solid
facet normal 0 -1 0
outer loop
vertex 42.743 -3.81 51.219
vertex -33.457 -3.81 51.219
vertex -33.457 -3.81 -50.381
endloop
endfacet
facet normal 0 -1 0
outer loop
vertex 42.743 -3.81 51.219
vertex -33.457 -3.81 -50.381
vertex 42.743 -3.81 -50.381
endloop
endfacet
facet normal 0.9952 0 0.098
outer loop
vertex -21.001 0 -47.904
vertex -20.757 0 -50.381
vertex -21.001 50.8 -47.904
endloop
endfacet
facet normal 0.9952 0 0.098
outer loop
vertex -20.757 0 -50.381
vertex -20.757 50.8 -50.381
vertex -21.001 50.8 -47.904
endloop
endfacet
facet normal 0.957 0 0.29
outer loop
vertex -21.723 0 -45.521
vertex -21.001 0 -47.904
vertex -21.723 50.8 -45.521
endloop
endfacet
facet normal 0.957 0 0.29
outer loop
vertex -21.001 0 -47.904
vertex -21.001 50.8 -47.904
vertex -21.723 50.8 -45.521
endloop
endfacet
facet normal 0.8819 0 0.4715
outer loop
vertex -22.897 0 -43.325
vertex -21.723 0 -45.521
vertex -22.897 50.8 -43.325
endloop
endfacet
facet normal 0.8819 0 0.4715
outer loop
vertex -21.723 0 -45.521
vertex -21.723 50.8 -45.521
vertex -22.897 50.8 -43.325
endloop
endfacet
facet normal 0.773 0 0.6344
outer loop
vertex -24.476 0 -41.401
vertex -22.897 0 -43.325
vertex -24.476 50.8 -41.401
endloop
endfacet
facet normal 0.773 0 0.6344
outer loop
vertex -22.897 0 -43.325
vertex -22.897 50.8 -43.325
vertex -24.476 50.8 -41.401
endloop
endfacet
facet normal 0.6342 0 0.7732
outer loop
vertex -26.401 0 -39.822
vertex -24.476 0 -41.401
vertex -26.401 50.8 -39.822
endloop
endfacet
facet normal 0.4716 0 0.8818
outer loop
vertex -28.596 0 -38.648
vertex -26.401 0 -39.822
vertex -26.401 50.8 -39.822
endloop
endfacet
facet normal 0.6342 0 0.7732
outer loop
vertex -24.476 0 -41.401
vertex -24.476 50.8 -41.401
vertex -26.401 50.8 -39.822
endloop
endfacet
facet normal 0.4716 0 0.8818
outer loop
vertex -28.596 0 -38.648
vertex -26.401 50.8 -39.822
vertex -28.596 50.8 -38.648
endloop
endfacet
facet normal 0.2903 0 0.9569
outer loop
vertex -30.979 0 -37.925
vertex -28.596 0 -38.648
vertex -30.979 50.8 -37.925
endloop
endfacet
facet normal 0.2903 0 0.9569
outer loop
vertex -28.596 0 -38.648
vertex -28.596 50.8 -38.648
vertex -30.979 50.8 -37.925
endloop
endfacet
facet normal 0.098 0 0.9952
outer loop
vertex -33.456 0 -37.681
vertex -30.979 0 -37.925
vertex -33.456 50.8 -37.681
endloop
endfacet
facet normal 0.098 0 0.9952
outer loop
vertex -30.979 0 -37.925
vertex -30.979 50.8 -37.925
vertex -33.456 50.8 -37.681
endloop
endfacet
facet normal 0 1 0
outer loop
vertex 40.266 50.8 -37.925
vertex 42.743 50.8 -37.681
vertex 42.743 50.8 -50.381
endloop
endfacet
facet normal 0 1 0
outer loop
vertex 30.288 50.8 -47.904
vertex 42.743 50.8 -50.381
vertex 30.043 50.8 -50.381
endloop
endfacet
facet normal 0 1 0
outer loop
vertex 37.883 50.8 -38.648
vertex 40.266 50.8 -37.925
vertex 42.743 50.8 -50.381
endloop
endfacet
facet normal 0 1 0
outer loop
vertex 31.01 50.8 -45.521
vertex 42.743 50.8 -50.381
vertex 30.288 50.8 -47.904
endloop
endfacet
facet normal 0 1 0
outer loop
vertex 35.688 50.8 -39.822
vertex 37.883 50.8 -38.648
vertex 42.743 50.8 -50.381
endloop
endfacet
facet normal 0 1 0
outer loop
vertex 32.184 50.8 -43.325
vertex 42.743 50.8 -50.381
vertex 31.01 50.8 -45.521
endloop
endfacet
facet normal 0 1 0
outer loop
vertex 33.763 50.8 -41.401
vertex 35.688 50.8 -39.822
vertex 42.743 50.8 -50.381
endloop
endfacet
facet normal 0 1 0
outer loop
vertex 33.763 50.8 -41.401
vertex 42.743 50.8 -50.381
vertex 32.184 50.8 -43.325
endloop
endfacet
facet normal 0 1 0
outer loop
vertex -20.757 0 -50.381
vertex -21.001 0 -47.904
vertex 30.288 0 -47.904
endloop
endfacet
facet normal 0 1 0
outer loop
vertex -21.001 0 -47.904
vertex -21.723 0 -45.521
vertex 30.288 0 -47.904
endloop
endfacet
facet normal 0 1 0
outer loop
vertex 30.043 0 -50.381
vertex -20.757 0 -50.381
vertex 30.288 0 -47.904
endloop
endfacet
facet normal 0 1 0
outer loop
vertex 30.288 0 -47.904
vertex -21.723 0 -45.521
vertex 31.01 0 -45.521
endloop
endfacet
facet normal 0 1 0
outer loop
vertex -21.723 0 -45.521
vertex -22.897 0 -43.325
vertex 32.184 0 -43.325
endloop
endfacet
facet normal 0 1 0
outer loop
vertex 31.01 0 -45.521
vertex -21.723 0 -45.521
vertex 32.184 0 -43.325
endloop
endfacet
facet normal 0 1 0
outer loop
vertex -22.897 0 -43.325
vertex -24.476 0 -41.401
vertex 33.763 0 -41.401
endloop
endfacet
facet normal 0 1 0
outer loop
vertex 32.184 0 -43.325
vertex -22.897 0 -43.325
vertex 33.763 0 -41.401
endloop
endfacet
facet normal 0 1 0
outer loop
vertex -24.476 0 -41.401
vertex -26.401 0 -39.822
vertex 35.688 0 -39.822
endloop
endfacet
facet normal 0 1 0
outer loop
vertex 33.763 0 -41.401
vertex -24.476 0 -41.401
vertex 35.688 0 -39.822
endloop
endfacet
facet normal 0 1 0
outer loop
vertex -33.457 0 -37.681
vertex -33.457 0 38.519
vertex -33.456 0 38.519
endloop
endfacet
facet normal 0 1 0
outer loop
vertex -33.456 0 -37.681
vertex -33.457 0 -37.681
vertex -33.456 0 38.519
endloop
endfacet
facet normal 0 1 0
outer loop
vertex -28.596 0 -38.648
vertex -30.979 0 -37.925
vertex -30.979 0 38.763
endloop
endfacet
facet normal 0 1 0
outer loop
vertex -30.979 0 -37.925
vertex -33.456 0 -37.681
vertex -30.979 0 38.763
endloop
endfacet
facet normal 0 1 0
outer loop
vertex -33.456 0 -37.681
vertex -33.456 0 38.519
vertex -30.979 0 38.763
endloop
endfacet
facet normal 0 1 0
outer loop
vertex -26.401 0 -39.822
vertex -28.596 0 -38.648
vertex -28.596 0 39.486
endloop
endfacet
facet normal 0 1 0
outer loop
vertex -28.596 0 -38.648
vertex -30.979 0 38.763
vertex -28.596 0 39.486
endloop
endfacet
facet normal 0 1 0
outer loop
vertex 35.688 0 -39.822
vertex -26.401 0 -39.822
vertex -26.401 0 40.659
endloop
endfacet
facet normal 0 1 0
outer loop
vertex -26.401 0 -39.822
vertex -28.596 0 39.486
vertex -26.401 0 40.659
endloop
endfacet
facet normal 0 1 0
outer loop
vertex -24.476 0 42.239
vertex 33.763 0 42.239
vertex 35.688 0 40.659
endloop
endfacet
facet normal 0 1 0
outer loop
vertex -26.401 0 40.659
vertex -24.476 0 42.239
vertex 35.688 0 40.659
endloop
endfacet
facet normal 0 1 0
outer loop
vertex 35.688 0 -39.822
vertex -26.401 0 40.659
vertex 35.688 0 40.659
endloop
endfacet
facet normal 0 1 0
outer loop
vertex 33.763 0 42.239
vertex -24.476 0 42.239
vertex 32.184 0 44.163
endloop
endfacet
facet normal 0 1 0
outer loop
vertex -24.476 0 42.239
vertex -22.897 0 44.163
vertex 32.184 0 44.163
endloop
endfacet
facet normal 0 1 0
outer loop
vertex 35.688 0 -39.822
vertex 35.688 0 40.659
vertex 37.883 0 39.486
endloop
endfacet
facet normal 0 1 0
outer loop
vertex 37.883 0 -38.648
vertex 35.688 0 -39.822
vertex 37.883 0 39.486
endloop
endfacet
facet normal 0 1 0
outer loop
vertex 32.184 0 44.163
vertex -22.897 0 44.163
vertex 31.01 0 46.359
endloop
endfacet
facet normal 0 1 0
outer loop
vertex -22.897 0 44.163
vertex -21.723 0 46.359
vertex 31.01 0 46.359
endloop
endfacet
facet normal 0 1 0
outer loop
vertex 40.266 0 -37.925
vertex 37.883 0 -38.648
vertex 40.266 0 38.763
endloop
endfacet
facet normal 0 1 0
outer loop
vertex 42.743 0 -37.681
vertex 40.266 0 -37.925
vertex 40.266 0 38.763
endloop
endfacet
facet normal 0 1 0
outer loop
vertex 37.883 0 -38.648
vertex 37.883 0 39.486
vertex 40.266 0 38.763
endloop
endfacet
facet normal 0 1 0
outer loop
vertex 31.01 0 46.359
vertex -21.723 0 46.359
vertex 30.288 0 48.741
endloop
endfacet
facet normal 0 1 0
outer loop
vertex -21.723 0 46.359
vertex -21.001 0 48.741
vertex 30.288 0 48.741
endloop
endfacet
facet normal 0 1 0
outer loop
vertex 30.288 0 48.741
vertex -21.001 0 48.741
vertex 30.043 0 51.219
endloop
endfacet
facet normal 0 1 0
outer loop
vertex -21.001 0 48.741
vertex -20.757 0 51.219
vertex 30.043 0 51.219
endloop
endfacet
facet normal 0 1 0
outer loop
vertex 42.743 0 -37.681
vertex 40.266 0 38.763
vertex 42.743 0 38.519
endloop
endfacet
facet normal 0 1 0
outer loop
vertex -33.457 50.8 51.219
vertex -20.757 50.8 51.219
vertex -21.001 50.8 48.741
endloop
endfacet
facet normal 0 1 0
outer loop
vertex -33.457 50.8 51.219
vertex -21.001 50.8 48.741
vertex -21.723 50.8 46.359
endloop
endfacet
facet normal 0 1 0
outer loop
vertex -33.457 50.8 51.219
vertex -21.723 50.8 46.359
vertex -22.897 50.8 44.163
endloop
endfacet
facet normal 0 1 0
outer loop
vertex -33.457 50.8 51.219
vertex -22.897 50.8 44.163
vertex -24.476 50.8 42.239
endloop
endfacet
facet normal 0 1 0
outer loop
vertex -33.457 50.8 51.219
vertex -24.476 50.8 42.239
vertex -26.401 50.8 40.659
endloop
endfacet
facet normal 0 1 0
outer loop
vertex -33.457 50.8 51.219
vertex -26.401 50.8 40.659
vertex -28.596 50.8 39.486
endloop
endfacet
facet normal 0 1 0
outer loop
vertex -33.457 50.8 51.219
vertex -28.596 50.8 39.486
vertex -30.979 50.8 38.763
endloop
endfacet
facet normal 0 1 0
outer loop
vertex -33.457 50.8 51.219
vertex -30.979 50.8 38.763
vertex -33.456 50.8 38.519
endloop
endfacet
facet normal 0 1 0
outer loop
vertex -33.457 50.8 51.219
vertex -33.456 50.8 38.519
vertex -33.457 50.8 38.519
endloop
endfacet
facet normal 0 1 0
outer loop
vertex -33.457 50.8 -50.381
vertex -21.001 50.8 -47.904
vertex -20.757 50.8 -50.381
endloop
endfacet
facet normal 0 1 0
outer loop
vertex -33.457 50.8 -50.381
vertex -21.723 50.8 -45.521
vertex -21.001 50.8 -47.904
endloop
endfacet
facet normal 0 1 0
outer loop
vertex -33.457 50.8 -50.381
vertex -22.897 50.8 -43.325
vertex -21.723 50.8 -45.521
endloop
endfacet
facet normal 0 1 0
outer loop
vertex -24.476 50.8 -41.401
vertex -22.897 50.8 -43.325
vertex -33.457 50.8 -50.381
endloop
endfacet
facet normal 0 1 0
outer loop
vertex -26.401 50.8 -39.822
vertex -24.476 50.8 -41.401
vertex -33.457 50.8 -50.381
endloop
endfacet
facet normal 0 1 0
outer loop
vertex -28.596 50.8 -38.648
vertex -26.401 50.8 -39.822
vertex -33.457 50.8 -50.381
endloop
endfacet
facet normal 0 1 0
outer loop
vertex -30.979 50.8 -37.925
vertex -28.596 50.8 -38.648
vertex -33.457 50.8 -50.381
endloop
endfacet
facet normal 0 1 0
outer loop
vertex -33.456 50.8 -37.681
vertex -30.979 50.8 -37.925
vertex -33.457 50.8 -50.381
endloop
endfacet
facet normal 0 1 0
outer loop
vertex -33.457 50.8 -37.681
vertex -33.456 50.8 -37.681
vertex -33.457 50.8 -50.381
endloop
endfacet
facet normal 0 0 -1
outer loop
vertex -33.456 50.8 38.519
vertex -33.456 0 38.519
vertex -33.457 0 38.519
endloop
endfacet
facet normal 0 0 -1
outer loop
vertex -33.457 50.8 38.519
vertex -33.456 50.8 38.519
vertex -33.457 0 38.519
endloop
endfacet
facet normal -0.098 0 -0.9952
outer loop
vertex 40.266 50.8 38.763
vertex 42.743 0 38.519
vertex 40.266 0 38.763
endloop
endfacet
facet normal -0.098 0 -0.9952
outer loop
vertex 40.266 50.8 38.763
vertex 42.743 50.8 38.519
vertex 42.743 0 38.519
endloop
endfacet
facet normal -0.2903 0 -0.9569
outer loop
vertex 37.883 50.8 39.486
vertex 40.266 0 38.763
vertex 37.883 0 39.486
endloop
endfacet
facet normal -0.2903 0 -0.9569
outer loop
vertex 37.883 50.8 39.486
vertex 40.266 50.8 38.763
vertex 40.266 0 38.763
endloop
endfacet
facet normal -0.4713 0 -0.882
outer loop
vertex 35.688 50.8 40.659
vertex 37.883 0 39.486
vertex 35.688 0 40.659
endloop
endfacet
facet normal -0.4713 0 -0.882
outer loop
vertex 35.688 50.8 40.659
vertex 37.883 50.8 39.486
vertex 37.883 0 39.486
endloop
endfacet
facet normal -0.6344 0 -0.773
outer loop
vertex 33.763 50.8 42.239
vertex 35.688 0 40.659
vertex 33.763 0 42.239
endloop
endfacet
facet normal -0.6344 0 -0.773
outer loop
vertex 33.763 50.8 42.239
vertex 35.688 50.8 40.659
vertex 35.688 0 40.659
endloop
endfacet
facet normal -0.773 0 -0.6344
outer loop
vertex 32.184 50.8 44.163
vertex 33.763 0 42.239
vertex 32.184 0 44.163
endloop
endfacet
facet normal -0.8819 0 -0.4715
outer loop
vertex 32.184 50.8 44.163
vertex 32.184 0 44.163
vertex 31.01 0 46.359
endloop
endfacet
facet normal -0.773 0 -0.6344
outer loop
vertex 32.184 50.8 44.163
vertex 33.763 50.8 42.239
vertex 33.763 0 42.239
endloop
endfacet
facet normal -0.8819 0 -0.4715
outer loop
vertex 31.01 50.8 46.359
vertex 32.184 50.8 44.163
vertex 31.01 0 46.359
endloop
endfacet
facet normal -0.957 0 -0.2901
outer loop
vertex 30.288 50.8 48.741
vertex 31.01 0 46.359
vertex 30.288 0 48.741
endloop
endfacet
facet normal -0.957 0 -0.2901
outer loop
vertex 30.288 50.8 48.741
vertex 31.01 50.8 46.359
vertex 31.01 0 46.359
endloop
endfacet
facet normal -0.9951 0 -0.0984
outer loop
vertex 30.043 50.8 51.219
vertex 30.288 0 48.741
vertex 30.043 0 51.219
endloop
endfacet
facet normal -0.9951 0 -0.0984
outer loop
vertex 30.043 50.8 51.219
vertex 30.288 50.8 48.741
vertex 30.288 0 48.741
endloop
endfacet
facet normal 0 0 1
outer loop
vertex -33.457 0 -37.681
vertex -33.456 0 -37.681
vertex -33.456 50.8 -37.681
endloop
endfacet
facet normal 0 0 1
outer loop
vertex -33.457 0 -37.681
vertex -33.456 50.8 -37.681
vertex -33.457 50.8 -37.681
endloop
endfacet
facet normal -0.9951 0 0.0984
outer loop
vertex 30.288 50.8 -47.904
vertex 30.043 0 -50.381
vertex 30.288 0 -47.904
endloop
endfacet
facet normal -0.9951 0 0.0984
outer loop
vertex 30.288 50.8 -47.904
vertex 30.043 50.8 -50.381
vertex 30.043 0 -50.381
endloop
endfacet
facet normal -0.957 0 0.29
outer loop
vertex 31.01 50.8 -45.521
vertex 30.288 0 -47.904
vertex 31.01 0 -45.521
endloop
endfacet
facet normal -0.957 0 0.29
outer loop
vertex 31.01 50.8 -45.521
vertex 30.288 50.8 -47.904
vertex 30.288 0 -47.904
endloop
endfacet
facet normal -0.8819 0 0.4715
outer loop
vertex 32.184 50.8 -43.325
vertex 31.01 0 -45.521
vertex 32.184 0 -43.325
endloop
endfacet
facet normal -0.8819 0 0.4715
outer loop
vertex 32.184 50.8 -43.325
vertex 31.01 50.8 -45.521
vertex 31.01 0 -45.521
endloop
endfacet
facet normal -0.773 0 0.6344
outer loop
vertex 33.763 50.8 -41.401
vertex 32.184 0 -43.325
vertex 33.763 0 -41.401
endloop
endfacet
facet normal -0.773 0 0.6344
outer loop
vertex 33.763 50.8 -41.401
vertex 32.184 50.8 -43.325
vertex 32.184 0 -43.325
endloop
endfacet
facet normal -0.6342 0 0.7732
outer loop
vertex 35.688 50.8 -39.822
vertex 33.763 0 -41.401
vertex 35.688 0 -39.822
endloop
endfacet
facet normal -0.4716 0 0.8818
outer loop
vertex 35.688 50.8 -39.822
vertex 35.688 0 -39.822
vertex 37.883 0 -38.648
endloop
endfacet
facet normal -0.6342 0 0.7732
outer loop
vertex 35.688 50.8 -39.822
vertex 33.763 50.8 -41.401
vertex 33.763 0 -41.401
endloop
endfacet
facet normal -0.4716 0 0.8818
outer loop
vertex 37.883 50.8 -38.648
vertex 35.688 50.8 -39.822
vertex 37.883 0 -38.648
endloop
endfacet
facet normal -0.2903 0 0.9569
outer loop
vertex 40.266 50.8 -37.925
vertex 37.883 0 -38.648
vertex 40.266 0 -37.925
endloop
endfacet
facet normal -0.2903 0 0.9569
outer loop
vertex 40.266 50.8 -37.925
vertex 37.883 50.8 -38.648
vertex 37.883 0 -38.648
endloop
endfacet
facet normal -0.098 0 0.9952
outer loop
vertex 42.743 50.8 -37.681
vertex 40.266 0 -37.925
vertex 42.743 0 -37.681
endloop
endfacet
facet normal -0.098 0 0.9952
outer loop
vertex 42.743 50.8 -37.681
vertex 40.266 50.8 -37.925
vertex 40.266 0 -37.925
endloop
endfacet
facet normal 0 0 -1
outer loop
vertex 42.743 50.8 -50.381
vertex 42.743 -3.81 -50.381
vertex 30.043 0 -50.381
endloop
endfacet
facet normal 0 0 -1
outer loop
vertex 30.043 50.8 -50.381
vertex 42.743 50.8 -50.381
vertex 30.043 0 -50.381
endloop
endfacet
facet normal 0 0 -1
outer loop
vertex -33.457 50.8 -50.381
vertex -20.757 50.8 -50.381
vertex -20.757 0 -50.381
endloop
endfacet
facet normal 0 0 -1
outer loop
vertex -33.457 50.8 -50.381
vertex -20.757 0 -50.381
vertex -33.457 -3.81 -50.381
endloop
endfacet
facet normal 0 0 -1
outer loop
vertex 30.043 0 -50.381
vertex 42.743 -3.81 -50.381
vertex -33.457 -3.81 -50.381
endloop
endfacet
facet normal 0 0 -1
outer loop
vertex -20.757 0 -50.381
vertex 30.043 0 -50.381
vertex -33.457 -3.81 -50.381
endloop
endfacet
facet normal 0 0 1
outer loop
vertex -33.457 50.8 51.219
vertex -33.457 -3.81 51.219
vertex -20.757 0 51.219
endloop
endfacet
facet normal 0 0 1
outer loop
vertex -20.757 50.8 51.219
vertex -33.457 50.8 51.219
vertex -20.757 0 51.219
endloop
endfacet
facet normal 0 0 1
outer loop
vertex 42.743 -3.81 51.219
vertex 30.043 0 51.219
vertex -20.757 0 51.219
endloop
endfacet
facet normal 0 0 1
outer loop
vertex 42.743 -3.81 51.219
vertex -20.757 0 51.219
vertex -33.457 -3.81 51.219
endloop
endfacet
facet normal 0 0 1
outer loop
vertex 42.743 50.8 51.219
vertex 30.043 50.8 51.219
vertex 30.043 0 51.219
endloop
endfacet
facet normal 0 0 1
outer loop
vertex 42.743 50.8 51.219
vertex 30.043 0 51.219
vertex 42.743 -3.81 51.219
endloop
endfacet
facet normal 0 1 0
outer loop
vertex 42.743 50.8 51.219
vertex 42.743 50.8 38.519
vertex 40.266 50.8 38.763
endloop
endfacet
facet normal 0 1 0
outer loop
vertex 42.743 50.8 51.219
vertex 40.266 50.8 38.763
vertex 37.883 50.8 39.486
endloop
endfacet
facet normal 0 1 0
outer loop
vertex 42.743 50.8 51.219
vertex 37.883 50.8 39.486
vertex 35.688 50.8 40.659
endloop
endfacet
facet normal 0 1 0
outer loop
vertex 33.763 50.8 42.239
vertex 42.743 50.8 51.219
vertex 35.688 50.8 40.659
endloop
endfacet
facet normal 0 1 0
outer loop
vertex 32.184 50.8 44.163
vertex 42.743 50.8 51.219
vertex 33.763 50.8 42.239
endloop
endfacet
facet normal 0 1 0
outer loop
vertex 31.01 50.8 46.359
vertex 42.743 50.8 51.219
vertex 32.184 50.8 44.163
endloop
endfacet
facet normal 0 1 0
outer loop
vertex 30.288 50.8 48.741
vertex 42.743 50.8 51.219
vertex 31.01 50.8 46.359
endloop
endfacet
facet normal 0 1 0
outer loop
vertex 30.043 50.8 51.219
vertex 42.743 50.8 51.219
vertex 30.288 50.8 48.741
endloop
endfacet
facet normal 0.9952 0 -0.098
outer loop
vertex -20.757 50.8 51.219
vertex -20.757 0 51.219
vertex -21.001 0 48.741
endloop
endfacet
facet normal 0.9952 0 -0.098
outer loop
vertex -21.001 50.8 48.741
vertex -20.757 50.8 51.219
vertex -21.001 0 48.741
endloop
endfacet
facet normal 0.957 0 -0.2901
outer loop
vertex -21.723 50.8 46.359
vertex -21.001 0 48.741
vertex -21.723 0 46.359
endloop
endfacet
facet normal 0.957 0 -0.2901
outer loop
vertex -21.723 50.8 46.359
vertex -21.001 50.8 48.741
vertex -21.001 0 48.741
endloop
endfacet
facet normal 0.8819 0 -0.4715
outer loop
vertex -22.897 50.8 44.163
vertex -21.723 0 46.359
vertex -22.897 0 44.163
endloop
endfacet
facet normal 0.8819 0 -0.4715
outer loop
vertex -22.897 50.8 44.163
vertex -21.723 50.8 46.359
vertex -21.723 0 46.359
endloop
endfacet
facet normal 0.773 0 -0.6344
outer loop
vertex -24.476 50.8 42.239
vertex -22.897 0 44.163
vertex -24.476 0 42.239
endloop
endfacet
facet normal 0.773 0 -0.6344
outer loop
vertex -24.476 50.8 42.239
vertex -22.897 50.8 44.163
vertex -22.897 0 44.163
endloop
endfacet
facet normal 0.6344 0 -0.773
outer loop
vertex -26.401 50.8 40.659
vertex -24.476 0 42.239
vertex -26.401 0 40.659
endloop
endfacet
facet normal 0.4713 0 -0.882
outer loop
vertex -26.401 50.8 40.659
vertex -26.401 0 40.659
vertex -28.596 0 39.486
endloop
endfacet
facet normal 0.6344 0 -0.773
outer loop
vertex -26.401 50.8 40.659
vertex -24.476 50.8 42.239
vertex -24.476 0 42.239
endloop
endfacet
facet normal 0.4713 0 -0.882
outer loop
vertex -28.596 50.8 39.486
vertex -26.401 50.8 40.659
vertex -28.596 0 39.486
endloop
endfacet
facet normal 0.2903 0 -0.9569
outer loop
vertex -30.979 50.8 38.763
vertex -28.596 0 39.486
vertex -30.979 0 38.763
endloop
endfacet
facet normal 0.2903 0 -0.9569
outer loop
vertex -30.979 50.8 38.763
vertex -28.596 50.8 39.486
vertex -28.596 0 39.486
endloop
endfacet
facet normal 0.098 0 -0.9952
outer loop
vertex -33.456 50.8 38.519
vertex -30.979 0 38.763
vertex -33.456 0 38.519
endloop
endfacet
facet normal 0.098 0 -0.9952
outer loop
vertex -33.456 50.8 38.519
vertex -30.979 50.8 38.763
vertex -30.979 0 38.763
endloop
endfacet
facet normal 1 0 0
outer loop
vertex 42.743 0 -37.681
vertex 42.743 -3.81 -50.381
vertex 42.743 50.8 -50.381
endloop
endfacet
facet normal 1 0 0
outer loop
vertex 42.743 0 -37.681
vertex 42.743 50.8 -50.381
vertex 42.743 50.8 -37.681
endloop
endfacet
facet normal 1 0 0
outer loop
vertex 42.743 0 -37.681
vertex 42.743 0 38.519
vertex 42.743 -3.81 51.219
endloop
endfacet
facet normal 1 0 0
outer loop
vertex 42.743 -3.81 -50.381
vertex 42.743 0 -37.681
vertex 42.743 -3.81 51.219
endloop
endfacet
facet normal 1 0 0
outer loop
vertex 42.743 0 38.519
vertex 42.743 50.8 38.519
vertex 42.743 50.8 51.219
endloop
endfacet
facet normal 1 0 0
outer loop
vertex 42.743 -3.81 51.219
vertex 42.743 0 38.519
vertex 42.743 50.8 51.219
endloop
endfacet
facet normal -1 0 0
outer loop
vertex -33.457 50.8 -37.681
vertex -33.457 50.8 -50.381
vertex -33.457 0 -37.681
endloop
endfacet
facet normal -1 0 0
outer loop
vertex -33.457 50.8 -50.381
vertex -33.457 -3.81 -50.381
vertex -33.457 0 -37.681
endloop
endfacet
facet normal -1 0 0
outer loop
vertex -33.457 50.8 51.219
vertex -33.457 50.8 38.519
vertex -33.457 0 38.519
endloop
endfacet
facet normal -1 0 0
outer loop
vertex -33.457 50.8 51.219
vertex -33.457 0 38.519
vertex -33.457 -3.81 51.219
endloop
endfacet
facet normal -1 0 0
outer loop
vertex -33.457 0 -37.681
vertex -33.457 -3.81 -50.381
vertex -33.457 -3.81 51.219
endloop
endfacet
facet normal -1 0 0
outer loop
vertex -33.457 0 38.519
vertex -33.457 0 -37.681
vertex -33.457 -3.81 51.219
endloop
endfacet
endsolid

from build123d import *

# Parameters (mm, degrees)
F0_W     = 76.2
F0_H     = 101.6
F1_DEPTH = 3.81
F2_W     = 12.7
F2_H     = 12.7
F3_DEPTH = 50.8
F4_R     = 12.69999


# Not quite as in the source:
# - a fillet or chamfer is up to 0.001 mm smaller than in the source, because OpenCascade refuses the exact size


with BuildPart() as f1:
    # F0 (on Front) → F1 (new body)
    with BuildSketch(Plane.XZ):
        with Locations((4.643493332, 0.4188035619)):
            Rectangle(F0_W, F0_H)
    extrude(amount=F1_DEPTH)

    # F2 (on face) → F3 (join)
    with BuildSketch(Plane(origin=(0, 0, 0), x_dir=(-1, 0, 0), z_dir=(0, 1, 0))):
        with Locations((27.106506668, -44.0311964381)):
            Rectangle(F2_W, F2_H)
        with Locations((-36.393493332, 44.8688035619)):
            Rectangle(F2_W, F2_H)
        with Locations((27.106506668, 44.8688035619)):
            Rectangle(F2_W, F2_H)
        with Locations((-36.393493332, -44.0311964381)):
            Rectangle(F2_W, F2_H)
    extrude(amount=F3_DEPTH)

    # F4 (radius 12.7 in the source; OpenCascade refuses exactly that, so slightly less here)
    f4_edges = [f1.edges().sort_by_distance(p)[0] for p in [
        (-20.756507, 25.4, 38.518804),
        (-20.756507, 25.4, -37.681196),
        (30.043493, 25.4, -37.681196),
        (30.043493, 25.4, 38.518804),
    ]]
    fillet(f4_edges, radius=F4_R)


solid = f1.part
